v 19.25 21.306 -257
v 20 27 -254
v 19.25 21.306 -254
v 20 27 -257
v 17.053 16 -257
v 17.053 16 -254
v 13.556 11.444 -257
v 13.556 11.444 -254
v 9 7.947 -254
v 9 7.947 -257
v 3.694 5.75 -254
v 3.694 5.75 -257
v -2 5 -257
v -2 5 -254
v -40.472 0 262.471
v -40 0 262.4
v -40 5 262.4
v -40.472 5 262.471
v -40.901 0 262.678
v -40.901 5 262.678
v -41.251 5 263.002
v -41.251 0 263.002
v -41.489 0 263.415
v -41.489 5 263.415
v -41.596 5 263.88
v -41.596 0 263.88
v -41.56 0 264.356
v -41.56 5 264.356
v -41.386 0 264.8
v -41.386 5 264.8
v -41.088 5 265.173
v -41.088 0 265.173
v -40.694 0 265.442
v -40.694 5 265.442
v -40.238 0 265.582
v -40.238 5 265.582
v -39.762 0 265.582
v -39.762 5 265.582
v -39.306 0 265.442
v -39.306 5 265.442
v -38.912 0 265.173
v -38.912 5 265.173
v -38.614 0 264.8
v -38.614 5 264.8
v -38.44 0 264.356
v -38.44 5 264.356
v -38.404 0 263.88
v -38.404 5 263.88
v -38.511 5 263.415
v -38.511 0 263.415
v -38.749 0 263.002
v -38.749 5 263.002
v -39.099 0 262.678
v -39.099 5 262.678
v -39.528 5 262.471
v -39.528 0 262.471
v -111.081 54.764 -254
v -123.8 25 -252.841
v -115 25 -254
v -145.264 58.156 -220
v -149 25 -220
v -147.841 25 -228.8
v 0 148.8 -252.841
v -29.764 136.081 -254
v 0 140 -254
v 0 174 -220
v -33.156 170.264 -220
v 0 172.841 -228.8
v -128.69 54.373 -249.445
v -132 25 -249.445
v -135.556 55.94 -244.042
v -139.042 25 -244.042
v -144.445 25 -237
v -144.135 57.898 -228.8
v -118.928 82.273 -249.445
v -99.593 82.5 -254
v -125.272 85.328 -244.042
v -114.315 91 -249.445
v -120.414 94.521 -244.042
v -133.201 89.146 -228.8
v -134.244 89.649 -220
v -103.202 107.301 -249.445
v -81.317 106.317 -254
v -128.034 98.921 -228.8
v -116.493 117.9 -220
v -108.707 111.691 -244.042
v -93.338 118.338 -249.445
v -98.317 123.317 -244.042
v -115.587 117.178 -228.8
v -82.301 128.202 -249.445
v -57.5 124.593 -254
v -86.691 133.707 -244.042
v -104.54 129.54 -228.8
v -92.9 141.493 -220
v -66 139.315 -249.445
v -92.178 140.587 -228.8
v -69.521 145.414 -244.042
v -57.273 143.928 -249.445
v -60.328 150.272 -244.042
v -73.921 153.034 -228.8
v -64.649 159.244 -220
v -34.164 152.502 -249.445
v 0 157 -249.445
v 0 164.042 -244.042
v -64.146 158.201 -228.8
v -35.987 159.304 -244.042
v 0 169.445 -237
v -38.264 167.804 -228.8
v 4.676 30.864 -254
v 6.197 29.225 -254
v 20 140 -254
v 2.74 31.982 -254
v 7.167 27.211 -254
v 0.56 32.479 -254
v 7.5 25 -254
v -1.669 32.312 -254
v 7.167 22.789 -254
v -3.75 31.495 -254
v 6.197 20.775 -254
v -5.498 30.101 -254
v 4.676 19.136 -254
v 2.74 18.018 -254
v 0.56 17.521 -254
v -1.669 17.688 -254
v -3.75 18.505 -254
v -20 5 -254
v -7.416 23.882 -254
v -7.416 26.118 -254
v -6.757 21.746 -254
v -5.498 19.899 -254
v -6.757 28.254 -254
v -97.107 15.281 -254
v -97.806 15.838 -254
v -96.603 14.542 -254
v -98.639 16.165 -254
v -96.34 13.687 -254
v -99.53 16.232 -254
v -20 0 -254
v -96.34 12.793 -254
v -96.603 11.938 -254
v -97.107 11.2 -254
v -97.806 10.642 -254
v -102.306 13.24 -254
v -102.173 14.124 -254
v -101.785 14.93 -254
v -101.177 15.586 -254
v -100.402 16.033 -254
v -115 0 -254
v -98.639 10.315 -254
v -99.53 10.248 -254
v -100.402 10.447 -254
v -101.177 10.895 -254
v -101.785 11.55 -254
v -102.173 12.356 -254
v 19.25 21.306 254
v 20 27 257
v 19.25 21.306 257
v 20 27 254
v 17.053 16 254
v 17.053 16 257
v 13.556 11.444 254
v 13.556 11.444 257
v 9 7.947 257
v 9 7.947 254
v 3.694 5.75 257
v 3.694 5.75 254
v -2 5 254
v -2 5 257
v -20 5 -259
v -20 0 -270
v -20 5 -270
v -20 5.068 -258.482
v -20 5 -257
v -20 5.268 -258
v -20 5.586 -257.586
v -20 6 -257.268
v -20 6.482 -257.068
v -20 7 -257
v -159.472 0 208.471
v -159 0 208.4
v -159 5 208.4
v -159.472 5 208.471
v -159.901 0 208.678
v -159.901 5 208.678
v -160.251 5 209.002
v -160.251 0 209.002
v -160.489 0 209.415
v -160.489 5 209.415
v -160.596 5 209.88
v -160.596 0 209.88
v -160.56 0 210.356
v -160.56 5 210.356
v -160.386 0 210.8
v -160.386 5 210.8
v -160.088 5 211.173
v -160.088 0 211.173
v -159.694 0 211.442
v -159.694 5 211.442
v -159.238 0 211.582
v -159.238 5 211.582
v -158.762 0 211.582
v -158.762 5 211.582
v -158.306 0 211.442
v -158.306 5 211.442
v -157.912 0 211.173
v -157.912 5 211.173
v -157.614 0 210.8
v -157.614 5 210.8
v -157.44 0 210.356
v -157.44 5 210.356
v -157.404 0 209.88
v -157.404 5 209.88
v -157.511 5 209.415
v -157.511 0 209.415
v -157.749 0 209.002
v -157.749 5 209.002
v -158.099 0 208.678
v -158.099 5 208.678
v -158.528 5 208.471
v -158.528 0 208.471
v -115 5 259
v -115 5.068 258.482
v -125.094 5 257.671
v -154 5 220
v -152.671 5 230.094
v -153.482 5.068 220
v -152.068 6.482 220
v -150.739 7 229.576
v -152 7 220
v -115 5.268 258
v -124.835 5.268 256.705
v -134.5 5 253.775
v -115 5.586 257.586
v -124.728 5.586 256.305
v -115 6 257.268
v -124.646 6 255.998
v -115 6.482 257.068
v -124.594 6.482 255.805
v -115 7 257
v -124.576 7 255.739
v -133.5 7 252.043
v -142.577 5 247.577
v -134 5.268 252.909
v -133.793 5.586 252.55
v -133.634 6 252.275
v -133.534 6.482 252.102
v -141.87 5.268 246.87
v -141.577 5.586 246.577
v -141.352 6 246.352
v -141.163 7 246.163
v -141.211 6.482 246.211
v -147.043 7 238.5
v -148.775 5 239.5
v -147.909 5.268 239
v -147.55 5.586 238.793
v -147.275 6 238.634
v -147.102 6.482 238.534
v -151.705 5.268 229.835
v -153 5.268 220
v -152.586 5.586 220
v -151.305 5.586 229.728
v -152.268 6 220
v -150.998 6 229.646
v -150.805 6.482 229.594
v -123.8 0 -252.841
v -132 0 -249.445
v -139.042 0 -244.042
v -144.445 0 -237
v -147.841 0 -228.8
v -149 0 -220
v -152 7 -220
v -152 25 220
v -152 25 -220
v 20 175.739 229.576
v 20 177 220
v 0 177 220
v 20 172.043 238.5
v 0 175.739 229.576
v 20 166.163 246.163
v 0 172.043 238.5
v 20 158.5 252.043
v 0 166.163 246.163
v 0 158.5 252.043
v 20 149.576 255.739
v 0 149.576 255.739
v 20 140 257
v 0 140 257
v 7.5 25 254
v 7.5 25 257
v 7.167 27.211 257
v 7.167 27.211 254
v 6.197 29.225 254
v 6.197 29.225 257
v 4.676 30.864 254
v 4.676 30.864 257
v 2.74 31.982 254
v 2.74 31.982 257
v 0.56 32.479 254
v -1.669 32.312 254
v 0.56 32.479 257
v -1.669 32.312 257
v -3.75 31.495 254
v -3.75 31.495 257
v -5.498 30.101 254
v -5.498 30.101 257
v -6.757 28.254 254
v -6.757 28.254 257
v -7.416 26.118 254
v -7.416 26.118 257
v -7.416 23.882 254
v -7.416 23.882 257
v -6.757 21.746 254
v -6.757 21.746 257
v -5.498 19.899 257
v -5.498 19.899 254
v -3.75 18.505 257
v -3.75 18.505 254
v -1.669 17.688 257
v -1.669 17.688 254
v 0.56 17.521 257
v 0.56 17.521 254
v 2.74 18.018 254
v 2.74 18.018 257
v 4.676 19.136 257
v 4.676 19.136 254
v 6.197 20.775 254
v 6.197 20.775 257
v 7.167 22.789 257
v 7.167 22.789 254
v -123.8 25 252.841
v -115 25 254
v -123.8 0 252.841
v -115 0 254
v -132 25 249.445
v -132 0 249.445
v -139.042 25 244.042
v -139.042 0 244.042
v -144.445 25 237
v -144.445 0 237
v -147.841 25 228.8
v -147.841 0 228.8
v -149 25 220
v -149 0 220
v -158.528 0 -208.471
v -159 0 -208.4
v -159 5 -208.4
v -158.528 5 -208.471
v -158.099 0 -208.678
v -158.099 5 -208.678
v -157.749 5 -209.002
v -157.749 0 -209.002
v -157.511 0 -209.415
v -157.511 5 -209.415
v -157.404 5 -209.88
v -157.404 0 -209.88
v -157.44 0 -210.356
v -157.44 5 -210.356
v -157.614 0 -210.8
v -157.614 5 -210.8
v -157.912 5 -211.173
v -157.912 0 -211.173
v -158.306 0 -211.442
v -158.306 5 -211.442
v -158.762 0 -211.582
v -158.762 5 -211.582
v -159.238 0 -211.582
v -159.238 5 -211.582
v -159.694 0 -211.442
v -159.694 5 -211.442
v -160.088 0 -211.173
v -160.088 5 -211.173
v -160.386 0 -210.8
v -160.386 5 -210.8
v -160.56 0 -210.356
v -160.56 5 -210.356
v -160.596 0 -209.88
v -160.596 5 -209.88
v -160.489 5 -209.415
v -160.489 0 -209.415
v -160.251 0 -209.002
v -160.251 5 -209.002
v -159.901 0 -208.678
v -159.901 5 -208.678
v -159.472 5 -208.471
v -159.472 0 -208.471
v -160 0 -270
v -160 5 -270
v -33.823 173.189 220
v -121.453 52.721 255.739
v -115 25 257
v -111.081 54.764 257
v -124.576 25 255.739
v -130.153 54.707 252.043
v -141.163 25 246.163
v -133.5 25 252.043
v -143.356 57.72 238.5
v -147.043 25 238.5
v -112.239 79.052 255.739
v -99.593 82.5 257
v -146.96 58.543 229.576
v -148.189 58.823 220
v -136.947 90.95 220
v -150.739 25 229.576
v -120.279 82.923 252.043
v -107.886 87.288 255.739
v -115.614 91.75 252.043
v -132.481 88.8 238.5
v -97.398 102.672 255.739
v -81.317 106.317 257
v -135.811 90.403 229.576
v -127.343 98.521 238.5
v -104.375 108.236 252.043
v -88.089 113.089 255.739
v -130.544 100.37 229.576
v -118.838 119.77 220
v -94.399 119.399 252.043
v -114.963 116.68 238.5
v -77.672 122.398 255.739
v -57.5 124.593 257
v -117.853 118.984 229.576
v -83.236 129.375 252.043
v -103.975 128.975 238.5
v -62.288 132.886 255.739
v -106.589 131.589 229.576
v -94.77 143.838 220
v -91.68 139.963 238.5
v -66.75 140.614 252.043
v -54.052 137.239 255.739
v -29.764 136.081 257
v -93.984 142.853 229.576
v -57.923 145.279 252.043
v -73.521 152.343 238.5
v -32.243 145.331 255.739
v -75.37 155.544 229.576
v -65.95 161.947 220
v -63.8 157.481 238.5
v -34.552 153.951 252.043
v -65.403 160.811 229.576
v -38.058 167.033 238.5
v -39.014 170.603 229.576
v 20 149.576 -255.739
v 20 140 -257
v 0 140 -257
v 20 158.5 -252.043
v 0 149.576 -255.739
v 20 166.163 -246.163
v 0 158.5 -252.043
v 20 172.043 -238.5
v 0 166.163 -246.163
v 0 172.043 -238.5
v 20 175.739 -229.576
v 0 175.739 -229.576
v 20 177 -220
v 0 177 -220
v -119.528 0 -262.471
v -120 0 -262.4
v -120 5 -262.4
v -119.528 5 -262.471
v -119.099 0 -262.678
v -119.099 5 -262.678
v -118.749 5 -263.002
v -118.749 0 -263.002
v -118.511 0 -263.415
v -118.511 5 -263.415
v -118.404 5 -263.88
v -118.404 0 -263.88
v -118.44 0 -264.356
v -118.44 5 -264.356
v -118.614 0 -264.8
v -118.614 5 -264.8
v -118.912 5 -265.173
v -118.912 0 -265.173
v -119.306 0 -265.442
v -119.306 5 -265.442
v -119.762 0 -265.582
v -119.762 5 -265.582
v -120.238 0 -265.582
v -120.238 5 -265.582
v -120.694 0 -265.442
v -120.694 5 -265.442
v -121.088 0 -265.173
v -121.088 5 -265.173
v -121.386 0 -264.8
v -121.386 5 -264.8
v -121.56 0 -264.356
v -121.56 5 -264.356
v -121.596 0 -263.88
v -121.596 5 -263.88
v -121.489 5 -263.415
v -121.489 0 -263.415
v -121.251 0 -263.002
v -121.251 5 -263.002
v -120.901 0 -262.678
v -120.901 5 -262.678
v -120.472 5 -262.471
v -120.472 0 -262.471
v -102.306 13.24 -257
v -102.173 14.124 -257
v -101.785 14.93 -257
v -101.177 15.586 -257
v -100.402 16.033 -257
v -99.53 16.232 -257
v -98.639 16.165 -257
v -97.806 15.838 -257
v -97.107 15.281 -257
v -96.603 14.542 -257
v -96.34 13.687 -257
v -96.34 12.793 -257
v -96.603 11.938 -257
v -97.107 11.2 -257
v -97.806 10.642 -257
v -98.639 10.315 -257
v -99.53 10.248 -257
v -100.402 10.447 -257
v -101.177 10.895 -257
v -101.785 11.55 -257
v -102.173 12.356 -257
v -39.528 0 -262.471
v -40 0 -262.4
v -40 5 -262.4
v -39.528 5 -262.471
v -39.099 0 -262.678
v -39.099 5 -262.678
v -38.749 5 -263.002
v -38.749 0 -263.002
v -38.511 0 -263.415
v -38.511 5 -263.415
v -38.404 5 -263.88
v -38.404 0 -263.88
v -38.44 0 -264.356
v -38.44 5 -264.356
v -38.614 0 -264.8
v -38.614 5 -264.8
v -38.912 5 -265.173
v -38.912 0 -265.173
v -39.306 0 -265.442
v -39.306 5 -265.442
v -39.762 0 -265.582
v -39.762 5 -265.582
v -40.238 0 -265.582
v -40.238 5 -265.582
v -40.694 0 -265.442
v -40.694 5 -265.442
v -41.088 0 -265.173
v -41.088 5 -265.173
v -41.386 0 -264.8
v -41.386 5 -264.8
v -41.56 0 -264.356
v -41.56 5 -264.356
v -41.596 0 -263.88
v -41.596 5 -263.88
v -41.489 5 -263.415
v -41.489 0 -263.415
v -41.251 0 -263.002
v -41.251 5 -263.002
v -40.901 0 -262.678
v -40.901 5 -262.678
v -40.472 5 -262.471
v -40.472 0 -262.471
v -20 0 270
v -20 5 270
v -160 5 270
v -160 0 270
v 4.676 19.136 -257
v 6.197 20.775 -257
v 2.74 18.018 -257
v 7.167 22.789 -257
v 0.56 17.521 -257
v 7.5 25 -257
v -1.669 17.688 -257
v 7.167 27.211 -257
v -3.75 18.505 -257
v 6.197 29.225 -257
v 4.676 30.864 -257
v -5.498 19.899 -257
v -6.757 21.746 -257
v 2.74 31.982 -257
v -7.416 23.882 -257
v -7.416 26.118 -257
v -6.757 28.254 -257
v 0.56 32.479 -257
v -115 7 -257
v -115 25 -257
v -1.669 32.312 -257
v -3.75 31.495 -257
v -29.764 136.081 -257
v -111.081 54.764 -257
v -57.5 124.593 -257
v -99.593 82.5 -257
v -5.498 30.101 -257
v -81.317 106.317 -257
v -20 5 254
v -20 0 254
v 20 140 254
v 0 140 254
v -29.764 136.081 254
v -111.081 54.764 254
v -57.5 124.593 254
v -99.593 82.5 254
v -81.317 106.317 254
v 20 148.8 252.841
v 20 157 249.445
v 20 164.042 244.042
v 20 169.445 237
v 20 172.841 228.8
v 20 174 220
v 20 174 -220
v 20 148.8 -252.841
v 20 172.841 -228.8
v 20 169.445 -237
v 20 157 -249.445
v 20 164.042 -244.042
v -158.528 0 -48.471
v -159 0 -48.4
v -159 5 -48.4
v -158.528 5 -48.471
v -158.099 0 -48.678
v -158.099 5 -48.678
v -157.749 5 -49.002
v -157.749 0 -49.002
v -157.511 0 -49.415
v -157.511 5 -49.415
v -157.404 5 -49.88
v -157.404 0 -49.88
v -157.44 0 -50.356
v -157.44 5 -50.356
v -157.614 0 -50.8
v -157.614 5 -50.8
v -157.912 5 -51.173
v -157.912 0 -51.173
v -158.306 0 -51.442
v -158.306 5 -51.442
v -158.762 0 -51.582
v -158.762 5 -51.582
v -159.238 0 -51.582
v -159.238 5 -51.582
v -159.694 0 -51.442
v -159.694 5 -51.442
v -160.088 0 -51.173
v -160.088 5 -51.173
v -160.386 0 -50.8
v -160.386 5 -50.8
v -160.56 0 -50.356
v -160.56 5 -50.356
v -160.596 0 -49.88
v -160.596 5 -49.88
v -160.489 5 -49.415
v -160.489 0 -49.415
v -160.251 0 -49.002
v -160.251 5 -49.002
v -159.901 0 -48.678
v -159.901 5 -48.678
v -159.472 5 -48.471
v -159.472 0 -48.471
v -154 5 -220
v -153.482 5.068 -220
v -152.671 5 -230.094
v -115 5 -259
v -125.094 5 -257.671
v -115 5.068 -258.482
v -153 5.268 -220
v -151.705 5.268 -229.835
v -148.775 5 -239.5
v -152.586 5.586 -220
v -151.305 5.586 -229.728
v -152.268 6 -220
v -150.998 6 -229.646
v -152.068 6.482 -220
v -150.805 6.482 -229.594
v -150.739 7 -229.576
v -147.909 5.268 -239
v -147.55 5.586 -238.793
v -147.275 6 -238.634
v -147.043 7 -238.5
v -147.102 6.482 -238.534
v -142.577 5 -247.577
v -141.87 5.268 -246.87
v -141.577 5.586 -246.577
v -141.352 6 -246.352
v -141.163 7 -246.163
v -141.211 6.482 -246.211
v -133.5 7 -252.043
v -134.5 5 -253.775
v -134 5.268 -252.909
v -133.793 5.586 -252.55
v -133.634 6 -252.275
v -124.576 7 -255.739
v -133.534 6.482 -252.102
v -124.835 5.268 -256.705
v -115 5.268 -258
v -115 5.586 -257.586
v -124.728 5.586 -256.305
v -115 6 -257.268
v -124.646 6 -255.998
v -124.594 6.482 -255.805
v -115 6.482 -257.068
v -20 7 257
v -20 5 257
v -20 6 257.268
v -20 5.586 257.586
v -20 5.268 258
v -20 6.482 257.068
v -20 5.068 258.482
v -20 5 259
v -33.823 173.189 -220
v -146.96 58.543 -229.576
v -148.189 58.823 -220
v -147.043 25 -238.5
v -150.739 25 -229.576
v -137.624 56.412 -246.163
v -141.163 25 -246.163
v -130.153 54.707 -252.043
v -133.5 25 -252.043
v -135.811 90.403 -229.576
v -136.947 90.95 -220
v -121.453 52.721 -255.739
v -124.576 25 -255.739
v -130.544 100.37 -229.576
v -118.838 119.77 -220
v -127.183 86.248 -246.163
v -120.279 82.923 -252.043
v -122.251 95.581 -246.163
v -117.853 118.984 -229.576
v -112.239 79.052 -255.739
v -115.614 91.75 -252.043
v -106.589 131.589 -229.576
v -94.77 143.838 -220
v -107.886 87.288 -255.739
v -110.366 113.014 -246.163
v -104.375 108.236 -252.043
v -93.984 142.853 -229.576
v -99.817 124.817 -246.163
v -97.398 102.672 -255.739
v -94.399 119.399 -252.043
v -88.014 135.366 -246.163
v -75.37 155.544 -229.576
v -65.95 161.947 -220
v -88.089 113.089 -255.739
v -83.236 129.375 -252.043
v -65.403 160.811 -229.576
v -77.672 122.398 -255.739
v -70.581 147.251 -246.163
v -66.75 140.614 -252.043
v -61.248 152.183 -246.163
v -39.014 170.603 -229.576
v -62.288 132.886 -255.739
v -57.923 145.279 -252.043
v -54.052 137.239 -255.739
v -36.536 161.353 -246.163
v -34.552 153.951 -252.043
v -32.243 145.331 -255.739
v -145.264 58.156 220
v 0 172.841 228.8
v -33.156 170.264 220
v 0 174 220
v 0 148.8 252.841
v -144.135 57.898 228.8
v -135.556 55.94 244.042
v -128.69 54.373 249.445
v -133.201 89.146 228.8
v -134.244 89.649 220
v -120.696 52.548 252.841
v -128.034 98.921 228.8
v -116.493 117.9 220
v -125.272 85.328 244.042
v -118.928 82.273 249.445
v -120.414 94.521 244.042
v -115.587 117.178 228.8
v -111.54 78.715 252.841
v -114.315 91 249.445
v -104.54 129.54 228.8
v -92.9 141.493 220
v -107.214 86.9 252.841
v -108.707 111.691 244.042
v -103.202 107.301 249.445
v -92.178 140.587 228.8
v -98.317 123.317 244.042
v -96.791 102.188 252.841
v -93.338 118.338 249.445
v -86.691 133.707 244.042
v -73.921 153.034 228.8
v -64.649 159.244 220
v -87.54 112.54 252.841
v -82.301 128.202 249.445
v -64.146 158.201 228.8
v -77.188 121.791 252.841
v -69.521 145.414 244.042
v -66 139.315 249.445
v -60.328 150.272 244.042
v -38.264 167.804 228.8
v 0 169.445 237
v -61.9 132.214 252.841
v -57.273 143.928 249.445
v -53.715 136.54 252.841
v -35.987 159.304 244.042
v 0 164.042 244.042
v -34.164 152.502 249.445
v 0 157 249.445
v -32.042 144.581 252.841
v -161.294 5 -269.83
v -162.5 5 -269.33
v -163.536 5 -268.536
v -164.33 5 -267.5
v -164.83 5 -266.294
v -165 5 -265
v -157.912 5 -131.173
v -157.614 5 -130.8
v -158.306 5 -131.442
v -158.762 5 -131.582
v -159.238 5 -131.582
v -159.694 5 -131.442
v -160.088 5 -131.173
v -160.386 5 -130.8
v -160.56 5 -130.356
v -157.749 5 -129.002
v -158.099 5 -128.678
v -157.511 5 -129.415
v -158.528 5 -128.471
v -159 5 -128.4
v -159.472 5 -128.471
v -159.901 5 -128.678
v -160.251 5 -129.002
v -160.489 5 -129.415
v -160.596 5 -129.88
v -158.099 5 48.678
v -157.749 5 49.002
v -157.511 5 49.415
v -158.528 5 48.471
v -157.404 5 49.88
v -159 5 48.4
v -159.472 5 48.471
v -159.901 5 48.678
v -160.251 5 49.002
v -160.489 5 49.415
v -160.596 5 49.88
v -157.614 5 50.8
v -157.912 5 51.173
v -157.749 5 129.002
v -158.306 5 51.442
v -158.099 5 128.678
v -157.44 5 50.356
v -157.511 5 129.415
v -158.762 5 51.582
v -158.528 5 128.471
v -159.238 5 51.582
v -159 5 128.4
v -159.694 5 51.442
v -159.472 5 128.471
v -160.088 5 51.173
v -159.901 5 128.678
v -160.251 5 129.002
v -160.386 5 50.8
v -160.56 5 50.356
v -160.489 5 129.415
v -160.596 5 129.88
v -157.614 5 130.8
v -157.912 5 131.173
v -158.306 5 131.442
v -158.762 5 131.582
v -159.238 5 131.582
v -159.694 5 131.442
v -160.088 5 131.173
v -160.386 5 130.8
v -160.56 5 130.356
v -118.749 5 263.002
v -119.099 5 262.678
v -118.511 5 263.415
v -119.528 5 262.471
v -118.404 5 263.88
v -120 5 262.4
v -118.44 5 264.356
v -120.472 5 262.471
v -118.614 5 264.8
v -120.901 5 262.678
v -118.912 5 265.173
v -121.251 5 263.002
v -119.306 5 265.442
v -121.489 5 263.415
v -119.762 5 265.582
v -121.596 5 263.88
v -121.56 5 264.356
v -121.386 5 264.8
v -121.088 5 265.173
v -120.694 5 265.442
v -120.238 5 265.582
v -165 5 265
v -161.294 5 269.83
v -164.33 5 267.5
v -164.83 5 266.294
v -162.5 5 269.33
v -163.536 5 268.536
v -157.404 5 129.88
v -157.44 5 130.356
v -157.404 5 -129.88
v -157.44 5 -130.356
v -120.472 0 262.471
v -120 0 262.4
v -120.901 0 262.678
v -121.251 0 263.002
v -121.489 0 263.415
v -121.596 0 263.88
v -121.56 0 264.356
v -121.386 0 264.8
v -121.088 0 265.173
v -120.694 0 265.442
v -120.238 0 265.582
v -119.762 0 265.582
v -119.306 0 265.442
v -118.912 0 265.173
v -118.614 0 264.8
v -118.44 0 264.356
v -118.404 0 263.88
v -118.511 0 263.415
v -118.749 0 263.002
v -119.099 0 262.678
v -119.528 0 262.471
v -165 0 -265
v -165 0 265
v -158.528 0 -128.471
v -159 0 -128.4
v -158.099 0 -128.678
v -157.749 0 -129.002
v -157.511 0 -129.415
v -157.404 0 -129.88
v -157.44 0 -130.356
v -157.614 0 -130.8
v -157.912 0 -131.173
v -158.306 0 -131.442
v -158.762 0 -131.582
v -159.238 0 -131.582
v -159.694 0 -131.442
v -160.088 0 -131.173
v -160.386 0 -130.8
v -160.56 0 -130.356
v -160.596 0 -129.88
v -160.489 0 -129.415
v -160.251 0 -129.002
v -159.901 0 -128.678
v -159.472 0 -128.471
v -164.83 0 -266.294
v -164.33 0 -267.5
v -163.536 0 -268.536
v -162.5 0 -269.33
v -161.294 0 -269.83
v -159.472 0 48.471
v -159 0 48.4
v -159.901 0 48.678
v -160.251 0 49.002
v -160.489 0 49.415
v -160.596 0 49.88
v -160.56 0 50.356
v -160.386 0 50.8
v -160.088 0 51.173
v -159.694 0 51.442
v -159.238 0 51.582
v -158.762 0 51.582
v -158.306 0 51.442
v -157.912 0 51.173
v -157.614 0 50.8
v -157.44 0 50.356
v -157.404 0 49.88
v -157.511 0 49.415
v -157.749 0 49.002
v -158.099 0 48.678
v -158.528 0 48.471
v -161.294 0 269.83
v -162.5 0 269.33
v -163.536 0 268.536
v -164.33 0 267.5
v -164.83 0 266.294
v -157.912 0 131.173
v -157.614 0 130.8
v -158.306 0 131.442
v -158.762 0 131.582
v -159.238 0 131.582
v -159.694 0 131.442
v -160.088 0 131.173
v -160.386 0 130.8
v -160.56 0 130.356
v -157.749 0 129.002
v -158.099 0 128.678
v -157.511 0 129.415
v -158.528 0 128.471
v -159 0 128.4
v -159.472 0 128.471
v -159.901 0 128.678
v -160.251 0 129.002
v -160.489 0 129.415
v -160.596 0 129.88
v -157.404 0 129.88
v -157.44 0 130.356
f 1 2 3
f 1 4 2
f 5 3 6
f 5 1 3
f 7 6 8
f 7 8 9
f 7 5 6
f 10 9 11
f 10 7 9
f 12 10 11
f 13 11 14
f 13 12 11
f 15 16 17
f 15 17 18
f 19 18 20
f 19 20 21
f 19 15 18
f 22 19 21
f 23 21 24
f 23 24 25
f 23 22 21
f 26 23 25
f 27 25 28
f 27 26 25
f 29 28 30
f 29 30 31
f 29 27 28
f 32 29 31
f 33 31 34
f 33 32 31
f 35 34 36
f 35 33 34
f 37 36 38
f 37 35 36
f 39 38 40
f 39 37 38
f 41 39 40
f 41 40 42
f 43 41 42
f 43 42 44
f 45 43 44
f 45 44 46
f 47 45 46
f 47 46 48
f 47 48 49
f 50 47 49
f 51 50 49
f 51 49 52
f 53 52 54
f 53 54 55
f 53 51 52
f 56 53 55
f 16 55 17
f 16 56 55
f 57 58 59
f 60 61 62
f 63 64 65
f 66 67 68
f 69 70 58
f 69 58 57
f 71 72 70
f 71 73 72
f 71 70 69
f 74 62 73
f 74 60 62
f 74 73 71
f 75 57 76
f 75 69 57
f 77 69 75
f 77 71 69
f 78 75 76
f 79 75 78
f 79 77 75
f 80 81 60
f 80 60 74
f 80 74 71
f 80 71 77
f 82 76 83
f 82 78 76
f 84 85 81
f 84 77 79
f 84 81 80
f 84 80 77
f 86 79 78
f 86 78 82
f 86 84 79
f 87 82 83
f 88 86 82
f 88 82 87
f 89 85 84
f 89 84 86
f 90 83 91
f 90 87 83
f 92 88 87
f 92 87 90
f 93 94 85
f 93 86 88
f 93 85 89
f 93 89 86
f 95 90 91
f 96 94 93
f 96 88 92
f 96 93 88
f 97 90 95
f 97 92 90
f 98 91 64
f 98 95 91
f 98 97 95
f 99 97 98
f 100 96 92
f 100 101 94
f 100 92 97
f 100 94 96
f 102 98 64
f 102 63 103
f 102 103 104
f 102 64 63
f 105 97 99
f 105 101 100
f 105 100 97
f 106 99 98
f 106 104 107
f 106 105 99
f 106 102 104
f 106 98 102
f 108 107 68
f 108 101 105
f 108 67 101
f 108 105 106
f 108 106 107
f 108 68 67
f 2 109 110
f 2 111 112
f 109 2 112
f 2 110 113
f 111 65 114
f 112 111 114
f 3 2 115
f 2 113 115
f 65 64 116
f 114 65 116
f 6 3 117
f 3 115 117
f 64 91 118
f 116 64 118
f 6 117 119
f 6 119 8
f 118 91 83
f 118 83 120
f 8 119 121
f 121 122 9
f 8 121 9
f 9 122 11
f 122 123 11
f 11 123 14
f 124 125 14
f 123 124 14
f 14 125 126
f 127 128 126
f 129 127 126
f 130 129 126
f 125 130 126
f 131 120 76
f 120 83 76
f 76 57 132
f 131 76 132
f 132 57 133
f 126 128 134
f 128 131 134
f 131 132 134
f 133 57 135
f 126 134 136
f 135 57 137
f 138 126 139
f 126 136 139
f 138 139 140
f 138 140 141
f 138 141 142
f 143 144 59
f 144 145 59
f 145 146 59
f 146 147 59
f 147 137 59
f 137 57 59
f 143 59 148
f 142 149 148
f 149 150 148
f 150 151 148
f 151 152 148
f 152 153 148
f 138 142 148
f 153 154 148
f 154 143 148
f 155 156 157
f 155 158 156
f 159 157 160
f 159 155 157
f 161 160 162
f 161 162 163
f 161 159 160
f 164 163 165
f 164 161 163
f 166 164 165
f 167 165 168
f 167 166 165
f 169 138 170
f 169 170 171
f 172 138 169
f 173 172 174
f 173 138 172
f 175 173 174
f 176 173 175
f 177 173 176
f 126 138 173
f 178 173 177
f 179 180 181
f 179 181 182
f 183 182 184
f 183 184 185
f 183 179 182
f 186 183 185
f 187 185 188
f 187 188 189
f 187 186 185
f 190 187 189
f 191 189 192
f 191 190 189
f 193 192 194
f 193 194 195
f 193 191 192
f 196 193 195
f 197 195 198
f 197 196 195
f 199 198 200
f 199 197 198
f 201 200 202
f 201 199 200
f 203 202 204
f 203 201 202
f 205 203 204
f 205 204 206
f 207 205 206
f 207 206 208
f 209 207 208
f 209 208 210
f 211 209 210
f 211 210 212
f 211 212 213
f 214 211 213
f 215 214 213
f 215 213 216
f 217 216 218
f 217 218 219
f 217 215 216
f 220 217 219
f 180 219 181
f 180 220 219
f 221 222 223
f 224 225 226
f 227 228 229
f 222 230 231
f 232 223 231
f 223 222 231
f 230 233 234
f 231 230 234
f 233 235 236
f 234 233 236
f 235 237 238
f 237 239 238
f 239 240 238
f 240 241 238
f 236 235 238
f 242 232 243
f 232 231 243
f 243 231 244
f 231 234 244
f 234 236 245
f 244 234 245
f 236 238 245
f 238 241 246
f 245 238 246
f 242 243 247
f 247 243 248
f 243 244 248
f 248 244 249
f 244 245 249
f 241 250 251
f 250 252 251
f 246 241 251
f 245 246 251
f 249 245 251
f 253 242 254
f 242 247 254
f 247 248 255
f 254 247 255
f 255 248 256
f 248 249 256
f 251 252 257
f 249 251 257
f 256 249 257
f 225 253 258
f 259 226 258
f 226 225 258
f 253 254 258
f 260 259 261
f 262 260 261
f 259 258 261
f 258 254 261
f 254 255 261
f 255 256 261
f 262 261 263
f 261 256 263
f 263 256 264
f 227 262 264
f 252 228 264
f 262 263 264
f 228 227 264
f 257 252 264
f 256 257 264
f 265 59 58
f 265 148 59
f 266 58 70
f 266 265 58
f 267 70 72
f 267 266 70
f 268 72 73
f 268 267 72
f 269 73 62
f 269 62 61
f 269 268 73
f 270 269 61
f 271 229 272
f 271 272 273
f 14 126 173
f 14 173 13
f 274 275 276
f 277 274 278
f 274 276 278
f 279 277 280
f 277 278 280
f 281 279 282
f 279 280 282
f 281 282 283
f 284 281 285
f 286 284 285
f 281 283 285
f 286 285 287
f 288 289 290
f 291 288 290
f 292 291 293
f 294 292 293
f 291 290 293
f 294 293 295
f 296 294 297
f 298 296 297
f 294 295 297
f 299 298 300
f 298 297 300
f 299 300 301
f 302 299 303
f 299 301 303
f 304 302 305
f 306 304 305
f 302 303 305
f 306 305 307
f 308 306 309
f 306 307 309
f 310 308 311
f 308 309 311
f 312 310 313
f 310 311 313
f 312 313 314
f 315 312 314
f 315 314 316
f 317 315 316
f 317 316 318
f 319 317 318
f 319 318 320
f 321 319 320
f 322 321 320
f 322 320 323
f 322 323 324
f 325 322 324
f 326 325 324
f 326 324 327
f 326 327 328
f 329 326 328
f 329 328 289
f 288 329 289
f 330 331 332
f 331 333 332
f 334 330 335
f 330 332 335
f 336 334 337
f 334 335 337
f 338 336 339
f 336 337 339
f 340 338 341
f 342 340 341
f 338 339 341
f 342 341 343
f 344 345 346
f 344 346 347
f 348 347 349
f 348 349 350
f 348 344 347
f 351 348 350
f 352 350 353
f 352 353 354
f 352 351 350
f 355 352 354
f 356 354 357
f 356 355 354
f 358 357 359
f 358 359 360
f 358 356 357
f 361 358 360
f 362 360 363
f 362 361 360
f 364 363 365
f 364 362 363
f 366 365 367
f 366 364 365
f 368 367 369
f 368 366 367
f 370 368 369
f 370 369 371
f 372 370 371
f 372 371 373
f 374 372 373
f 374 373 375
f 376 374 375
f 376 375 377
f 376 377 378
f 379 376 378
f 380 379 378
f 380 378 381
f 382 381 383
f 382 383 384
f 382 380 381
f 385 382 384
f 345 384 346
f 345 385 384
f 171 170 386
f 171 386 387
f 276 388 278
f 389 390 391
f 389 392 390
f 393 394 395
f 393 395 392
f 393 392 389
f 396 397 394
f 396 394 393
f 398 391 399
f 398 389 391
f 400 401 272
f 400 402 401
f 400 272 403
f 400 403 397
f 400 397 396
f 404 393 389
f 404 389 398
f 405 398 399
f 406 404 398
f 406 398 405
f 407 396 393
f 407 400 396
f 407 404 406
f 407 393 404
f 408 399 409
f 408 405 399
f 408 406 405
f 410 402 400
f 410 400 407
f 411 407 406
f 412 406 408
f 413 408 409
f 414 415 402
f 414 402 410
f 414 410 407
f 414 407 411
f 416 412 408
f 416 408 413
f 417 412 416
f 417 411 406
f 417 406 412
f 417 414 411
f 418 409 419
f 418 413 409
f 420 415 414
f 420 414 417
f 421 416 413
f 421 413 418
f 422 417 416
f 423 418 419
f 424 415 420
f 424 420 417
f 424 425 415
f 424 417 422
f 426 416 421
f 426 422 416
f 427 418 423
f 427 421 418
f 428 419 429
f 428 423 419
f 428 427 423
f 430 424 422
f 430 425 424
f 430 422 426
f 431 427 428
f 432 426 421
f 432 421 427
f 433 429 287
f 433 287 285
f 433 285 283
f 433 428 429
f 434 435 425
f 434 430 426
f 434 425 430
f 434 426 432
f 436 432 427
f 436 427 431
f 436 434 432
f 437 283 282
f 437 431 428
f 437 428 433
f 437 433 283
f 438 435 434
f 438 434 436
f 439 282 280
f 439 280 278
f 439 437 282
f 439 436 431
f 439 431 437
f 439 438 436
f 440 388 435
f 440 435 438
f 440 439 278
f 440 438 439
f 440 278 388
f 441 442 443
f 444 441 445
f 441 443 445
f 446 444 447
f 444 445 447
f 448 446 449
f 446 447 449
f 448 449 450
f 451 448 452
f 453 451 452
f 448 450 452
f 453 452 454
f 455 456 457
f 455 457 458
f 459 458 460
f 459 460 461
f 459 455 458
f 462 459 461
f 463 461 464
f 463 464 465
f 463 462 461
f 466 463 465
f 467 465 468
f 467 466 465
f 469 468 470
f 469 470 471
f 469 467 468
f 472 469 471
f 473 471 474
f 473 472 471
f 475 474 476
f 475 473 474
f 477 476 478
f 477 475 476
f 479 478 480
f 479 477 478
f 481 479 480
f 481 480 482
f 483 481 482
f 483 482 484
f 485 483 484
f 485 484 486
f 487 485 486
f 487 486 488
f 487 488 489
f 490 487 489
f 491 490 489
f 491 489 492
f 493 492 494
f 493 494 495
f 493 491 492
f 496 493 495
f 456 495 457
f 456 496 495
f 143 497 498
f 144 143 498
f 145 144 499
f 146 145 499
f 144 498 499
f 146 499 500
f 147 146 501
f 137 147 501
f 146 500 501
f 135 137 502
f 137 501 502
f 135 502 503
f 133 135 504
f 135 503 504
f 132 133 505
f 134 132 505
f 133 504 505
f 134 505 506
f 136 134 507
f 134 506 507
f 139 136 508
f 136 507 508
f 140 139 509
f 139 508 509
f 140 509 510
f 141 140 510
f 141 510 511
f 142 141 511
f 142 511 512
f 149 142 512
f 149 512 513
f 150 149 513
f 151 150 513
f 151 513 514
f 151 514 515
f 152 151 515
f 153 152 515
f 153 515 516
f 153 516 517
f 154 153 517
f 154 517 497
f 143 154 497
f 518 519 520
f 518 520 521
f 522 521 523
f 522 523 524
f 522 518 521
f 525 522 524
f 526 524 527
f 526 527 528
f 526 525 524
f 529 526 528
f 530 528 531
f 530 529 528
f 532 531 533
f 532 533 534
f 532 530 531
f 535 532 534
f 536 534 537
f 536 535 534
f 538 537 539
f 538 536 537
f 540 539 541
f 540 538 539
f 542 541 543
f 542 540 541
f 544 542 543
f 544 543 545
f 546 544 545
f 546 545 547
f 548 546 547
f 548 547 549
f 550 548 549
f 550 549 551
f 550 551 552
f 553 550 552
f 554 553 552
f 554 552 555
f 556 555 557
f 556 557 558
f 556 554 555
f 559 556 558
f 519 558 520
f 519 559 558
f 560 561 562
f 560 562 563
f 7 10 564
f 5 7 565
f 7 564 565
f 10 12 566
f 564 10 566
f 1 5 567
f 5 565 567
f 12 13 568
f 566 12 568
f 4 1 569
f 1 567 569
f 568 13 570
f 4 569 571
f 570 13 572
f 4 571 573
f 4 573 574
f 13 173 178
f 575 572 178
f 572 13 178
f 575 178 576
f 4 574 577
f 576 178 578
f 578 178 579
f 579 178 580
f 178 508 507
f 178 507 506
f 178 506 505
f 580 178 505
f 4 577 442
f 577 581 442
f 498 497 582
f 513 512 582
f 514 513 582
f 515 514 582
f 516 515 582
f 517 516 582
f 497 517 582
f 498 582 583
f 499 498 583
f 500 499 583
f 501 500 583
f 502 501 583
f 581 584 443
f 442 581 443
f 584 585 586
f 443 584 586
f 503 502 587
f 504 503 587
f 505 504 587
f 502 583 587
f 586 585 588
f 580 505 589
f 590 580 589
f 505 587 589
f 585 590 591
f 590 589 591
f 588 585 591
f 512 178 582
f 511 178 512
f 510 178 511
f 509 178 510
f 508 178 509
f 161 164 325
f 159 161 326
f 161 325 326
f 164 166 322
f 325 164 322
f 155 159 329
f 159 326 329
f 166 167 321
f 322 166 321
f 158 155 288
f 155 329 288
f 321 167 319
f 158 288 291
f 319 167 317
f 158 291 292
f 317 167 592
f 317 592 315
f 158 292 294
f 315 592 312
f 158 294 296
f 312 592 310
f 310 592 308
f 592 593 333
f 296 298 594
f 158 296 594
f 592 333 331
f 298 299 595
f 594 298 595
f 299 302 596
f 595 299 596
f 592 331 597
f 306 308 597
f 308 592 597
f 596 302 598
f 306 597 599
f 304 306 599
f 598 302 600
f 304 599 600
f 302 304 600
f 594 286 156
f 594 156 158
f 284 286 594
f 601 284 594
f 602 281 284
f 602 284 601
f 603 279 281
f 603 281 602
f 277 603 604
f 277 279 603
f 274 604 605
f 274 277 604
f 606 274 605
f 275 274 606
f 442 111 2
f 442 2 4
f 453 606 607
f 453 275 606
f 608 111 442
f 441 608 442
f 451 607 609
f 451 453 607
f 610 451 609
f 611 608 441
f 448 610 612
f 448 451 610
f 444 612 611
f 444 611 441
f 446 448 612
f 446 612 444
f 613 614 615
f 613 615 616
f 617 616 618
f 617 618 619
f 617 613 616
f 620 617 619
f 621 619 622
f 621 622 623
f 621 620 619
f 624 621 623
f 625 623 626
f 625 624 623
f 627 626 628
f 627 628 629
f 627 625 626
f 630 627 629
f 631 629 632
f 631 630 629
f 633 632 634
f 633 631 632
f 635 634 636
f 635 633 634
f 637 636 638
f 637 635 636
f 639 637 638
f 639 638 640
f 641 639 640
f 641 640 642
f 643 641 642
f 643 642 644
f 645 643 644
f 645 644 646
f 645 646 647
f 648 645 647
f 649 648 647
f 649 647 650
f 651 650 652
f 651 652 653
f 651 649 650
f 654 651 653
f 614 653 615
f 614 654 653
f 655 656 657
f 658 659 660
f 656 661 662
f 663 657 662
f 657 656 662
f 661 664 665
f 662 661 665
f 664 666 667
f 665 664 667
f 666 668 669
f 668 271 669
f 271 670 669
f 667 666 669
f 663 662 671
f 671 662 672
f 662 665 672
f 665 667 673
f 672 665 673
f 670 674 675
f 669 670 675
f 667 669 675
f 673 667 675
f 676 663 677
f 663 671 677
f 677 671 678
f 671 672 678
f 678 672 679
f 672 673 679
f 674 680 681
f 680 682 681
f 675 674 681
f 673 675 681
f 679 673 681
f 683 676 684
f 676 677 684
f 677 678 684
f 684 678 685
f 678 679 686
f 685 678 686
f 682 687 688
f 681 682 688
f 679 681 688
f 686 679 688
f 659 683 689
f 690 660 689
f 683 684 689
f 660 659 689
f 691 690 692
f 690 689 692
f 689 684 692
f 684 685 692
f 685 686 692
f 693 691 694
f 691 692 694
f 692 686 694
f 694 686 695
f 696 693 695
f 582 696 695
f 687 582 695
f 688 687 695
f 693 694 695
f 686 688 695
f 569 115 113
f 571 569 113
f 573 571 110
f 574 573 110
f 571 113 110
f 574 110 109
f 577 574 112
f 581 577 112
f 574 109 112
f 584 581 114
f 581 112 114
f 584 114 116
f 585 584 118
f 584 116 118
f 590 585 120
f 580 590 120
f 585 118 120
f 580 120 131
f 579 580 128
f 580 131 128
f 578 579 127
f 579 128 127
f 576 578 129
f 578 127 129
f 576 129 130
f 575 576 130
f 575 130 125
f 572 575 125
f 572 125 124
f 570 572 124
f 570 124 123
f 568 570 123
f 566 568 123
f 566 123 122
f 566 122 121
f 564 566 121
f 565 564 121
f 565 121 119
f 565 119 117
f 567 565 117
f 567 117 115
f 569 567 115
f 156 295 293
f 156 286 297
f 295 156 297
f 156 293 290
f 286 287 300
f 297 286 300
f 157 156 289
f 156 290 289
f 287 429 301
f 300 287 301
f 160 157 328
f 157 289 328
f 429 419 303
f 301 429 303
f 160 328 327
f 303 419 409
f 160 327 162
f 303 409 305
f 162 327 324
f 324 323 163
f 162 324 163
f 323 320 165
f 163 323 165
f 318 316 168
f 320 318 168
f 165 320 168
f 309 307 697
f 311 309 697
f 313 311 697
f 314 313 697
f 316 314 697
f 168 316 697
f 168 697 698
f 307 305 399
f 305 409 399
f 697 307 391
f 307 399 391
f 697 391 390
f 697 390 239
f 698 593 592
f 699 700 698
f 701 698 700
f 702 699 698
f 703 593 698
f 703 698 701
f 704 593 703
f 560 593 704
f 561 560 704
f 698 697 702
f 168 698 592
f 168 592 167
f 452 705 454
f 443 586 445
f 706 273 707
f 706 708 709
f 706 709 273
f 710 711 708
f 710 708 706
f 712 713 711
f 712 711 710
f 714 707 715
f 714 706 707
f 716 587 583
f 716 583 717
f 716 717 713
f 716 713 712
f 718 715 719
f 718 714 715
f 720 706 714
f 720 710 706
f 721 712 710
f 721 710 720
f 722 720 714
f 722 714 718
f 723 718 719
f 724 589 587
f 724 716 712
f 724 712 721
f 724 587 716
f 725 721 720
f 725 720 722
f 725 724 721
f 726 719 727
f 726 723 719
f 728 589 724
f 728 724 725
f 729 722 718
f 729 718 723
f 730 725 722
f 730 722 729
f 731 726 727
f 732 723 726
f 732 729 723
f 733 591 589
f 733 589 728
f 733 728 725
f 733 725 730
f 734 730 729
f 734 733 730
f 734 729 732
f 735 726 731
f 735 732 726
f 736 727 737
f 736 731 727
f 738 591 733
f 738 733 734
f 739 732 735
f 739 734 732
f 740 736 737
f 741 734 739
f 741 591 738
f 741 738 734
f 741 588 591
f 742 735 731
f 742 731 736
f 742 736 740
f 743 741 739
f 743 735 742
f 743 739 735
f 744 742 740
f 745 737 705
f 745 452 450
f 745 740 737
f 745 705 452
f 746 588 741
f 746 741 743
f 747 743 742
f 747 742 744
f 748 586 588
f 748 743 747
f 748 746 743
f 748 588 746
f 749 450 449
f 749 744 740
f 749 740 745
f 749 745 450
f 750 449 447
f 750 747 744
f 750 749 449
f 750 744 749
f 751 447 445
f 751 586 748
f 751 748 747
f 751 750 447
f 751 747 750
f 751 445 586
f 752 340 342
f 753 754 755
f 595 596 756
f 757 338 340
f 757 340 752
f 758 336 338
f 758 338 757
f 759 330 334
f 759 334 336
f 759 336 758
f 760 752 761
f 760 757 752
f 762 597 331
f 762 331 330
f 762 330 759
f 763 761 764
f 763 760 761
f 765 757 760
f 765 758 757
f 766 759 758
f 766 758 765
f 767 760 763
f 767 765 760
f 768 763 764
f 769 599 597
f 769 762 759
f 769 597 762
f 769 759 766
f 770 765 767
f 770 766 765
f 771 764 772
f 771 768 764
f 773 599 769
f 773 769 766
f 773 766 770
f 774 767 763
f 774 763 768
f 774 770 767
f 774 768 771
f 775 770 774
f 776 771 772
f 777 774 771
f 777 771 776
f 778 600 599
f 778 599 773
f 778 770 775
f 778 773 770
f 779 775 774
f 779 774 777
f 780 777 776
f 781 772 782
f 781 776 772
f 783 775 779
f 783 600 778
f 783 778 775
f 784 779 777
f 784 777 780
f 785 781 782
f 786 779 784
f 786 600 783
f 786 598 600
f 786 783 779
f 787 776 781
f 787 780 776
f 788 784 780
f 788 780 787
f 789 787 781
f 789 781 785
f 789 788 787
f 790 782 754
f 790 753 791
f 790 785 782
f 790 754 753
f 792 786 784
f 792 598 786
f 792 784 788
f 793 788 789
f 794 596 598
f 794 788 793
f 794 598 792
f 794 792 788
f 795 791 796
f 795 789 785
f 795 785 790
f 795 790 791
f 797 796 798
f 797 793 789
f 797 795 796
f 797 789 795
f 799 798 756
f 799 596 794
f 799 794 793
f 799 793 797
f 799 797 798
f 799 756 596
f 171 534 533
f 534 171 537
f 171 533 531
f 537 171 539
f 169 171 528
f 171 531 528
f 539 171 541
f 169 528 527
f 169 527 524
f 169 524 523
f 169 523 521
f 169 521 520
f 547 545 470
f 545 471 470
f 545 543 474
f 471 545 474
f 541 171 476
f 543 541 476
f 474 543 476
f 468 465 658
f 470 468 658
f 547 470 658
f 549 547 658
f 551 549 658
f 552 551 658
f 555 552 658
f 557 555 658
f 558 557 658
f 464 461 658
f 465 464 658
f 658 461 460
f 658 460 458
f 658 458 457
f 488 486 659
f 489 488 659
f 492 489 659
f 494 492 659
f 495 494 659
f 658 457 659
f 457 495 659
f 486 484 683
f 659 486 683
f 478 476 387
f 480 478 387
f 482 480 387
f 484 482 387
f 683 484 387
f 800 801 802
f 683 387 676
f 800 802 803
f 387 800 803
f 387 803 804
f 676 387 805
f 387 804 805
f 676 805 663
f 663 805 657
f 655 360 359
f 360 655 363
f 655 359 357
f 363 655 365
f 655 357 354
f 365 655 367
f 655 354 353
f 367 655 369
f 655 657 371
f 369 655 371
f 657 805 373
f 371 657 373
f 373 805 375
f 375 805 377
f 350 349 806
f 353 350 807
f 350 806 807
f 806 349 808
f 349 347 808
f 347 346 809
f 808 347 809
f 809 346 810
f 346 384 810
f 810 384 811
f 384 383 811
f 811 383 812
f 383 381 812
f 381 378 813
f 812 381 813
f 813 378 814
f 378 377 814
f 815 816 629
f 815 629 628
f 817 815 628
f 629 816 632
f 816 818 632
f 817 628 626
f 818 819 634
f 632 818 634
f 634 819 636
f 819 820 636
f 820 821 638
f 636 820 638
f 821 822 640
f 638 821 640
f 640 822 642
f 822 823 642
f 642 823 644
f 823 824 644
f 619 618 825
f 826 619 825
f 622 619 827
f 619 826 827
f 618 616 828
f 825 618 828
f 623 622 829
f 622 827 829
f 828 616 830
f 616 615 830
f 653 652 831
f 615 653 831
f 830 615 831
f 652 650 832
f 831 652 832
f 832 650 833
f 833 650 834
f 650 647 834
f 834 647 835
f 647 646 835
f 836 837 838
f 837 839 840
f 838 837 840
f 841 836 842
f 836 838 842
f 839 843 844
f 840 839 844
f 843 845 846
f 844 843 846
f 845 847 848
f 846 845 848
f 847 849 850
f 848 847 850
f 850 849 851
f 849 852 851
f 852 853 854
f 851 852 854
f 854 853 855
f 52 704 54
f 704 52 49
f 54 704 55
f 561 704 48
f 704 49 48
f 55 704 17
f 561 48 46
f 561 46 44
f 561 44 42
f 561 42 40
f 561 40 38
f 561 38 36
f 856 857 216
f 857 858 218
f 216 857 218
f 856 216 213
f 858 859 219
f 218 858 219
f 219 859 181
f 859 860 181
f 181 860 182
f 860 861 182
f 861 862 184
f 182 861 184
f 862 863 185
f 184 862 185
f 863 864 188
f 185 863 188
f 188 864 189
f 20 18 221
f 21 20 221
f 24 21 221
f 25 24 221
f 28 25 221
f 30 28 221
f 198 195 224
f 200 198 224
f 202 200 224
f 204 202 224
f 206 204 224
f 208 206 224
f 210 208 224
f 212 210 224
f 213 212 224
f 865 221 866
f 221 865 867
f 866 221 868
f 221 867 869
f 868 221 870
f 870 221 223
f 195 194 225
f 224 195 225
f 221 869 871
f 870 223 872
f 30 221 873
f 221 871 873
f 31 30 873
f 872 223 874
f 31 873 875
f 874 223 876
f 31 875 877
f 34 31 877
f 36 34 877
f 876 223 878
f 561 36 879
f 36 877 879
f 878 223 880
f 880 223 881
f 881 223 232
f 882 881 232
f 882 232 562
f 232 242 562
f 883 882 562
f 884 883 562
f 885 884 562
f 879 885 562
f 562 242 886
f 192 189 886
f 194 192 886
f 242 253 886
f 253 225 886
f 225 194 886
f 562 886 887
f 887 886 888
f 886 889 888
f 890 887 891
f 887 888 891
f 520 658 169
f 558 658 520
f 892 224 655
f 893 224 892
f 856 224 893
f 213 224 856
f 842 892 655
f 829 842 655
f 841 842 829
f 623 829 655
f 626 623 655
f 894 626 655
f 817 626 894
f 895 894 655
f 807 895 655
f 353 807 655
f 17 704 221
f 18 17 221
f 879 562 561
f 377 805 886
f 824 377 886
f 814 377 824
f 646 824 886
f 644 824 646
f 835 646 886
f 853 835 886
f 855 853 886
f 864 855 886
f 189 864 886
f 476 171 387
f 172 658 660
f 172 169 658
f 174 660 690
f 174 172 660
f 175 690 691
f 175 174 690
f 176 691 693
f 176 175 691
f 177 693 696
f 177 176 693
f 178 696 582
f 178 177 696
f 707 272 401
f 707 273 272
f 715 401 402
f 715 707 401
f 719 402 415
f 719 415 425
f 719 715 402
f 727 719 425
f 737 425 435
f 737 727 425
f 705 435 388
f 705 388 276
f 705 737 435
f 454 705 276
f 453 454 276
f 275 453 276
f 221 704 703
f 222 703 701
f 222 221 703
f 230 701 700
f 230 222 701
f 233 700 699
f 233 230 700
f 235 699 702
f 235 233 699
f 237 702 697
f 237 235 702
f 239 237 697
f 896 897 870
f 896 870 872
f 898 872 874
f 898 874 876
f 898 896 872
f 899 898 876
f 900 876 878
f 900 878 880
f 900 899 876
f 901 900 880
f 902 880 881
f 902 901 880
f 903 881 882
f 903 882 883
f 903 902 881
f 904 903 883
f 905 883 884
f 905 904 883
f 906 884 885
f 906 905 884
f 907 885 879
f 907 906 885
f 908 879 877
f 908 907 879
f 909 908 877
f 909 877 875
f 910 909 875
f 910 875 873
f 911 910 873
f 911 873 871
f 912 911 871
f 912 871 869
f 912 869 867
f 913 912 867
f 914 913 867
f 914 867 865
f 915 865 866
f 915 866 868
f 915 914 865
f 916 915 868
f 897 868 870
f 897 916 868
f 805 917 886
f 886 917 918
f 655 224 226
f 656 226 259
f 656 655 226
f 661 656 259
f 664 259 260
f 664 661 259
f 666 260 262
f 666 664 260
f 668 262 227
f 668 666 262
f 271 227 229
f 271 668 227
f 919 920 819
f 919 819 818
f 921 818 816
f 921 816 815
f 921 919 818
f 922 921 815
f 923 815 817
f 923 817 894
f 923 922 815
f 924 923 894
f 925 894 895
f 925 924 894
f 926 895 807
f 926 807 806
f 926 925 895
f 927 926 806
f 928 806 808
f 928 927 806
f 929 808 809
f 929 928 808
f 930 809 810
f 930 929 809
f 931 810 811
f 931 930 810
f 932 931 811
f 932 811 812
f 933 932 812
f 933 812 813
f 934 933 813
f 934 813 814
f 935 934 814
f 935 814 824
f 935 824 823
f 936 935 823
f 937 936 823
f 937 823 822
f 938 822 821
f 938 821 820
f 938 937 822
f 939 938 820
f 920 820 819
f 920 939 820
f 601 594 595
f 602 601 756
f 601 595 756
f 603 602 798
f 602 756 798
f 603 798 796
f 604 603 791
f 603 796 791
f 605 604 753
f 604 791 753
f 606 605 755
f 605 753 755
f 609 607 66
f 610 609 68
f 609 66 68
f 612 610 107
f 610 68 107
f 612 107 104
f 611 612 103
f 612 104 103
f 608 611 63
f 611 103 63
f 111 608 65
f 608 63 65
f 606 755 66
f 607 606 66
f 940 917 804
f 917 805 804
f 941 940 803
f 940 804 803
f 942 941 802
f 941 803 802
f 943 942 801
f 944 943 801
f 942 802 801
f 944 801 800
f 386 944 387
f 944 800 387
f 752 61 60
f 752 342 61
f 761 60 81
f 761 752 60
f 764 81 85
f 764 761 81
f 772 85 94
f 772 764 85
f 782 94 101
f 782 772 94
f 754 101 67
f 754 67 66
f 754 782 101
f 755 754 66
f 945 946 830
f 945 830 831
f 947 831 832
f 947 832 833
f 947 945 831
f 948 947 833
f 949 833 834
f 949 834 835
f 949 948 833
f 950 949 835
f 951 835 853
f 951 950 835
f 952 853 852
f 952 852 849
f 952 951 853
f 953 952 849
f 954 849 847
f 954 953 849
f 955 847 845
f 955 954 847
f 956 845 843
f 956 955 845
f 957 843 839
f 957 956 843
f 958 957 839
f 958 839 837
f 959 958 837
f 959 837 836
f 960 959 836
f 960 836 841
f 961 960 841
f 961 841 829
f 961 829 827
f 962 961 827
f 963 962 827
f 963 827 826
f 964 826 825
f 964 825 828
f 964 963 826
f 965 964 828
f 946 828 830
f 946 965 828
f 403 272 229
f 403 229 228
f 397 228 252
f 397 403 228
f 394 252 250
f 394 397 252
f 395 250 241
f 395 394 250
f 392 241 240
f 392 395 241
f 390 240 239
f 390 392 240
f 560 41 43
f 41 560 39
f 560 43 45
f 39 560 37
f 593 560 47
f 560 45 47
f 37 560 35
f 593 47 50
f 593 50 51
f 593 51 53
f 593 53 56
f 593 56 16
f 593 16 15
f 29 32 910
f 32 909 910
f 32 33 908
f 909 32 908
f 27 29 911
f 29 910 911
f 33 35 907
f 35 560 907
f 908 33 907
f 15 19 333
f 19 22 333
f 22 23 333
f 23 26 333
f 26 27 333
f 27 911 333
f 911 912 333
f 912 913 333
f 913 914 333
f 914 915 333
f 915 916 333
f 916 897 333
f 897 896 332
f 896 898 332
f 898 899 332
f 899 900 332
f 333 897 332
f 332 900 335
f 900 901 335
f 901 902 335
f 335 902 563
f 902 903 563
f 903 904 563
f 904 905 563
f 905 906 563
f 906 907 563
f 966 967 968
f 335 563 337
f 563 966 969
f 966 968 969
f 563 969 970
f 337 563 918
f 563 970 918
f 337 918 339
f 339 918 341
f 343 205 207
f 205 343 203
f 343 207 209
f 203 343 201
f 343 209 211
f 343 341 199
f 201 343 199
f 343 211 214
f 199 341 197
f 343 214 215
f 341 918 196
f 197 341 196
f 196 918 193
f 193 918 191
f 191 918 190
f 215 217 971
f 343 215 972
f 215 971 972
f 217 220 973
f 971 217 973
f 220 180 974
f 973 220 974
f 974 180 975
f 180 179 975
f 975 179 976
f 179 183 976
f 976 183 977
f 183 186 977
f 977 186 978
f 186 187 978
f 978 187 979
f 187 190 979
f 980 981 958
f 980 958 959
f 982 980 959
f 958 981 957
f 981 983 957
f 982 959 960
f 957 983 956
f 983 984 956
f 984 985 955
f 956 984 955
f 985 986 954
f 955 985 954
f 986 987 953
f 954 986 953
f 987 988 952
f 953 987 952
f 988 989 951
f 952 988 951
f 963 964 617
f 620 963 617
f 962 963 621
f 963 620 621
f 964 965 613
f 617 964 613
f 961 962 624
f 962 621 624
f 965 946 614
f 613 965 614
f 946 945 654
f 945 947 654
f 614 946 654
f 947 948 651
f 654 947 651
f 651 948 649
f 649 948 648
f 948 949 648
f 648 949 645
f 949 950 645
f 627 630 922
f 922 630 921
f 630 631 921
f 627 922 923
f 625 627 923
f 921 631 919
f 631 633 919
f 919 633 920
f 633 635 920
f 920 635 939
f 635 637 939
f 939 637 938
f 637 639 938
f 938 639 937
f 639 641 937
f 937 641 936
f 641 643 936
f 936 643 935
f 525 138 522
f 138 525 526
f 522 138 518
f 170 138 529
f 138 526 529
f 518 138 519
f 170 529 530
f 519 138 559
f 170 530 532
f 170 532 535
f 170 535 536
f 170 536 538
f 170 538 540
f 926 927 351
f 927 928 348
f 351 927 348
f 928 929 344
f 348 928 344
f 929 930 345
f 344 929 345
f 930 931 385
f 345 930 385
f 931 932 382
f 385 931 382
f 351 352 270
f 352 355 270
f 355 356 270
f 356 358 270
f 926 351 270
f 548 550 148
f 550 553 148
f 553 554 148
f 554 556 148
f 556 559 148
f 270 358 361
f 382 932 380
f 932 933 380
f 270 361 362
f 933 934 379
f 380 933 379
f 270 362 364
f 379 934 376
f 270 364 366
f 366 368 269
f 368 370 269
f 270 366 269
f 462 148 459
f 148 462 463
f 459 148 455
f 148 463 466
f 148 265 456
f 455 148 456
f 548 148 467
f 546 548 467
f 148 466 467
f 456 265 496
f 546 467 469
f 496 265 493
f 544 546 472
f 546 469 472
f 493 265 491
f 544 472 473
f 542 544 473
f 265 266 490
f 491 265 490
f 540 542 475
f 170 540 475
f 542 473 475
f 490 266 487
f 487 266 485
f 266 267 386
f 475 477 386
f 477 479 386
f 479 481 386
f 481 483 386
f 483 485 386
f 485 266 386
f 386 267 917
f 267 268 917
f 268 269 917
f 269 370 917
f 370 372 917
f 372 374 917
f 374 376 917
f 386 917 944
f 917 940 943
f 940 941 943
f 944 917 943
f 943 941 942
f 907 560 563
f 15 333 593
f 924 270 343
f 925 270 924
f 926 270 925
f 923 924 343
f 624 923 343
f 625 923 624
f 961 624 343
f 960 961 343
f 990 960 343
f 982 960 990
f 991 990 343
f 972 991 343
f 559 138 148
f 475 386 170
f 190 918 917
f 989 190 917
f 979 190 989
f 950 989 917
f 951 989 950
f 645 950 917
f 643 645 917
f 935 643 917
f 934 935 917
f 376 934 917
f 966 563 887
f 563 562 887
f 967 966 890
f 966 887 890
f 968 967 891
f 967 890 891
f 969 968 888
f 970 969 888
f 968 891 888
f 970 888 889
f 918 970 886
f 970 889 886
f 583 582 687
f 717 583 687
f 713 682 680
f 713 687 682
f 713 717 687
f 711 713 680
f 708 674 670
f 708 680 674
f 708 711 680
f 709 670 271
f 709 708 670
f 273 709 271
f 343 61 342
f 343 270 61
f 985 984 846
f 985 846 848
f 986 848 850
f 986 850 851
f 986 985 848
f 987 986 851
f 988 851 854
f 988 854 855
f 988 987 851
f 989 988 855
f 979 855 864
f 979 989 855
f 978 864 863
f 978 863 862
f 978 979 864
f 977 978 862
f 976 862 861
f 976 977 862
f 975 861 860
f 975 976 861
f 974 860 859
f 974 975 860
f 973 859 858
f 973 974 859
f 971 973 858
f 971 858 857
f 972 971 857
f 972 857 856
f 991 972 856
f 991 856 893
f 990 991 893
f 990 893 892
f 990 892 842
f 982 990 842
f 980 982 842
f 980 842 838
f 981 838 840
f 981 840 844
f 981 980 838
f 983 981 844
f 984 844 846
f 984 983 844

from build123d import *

# Parameters (mm, degrees)
SKETCH1_R           = 1.6
BOSS_EXTRUDE1_DEPTH = 5
BOSS_EXTRUDE5_DEPTH = 20
FILLET8_R           = 34
FILLET9_R           = 37
REVOLVE4_ANGLE      = 90
BOSS_EXTRUDE6_DEPTH = 20
CUT_EXTRUDE3_REACH  = 593.738
SKETCH16_W          = 40
SKETCH16_H          = 5
FILLET10_R          = 22
CUT_EXTRUDE4_REACH  = 581.899
SKETCH17_R          = 7.5
FILLET11_R          = 5
FILLET12_R          = 2
SKETCH18_R          = 3
CUT_EXTRUDE5_DEPTH  = 7


with BuildPart() as part:
    # Sketch1 → Boss-Extrude1 (new body)
    with BuildSketch(Plane(origin=(0, 0, 0), x_dir=(1, 0, 0), z_dir=(0, 1, 0))):
        Polygon((-165, 270), (-165, -270), (0, -270), (0, -254), (-149, -254), (-149, 254), (0, 254), (0, 270), align=None)
        with Locations(Location((-159, 130, 0), (0, 0, 270))):
            Circle(SKETCH1_R, mode=Mode.SUBTRACT)
        with Locations(Location((-159, 50, 0), (0, 0, 270))):
            Circle(SKETCH1_R, mode=Mode.SUBTRACT)
        with Locations(Location((-120, 264, 0), (0, 0, 270))):
            Circle(SKETCH1_R, mode=Mode.SUBTRACT)
        with Locations(Location((-40, 264, 0), (0, 0, 270))):
            Circle(SKETCH1_R, mode=Mode.SUBTRACT)
        with Locations(Location((-159, 210, 0), (0, 0, 270))):
            Circle(SKETCH1_R, mode=Mode.SUBTRACT)
        with Locations(Location((-40, -264, 0), (0, 0, 90))):
            Circle(SKETCH1_R, mode=Mode.SUBTRACT)
        with Locations(Location((-120, -264, 0), (0, 0, 90))):
            Circle(SKETCH1_R, mode=Mode.SUBTRACT)
        with Locations(Location((-159, -210, 0), (0, 0, 90))):
            Circle(SKETCH1_R, mode=Mode.SUBTRACT)
        with Locations(Location((-159, -50, 0), (0, 0, 90))):
            Circle(SKETCH1_R, mode=Mode.SUBTRACT)
        with Locations(Location((-159, -130, 0), (0, 0, 90))):
            Circle(SKETCH1_R, mode=Mode.SUBTRACT)
    extrude(amount=BOSS_EXTRUDE1_DEPTH)

    # Sketch12 → Boss-Extrude5 (add)
    with BuildSketch(Plane(origin=(0, 5, 0), x_dir=(1, 0, 0), z_dir=(0, 1, 0))):
        Polygon((0, 254), (-149, 254), (-149, -254), (0, -254), (0, -257), (-152, -257), (-152, 257), (0, 257), align=None)
    extrude(amount=BOSS_EXTRUDE5_DEPTH)

    # Fillet8
    fillet8_edges = [part.edges().sort_by_distance(p)[0] for p in [
        (-149, 12.5, -254),
        (-149, 12.5, 254),
    ]]
    fillet(fillet8_edges, radius=FILLET8_R)

    # Fillet9
    fillet9_edges = [part.edges().sort_by_distance(p)[0] for p in [
        (-152, 15, -257),
        (-152, 15, 257),
    ]]
    fillet(fillet9_edges, radius=FILLET9_R)

    # Sketch13 → Revolve4 (revolve)
    with BuildSketch(Plane(origin=(0, 25, 0), x_dir=(1, 0, 0), z_dir=(0, 1, 0))):
        with BuildLine():
            Line((0, 254), (-115, 254))
            ThreePointArc((-115, 254), (-139.04163056, 244.04163056), (-149, 220))
            Line((-149, 220), (-149, -220))
            ThreePointArc((-149, -220), (-139.04163056, -244.04163056), (-115, -254))
            Line((-115, -254), (0, -254))
            Line((0, -254), (0, -257))
            Line((0, -257), (-115, -257))
            ThreePointArc((-115, -257), (-141.162950904, -246.162950904), (-152, -220))
            Line((-152, -220), (-152, 220))
            ThreePointArc((-152, 220), (-141.162950904, 246.162950904), (-115, 257))
            Line((-115, 257), (0, 257))
            Line((0, 257), (0, 254))
        make_face()
    revolve(axis=Axis((0, 25, -257), (0, 0, -1)), revolution_arc=REVOLVE4_ANGLE)

    # Sketch15 → Boss-Extrude6 (add)
    with BuildSketch(Plane(origin=(0, 0, 0), x_dir=(0, 0, -1), z_dir=(1, 0, 0))):
        with BuildLine():
            Line((-254, 5), (-254, 140))
            ThreePointArc((-254, 140), (-244.04163056, 164.04163056), (-220, 174))
            Line((-220, 174), (220, 174))
            ThreePointArc((220, 174), (244.04163056, 164.04163056), (254, 140))
            Line((254, 140), (254, 5))
            Line((254, 5), (254, 0))
            Line((254, 0), (270, 0))
            Line((270, 0), (270, 5))
            Line((270, 5), (257, 5))
            Line((257, 5), (257, 140))
            ThreePointArc((257, 140), (246.162950904, 166.162950904), (220, 177))
            Line((220, 177), (-220, 177))
            ThreePointArc((-220, 177), (-246.162950904, 166.162950904), (-257, 140))
            Line((-257, 140), (-257, 5))
            Line((-257, 5), (-270, 5))
            Line((-270, 5), (-270, 0))
            Line((-270, 0), (-254, 0))
            Line((-254, 0), (-254, 5))
        make_face()
    extrude(amount=BOSS_EXTRUDE6_DEPTH)

    # Cut-Extrude3: up to this face of the body (flat: up to its plane)
    cut_extrude3_end = Plane(part.part.faces().sort_by_distance((-72.5, 2.5, -270))[0])
    # Sketch16 → Cut-Extrude3 (cut, up to the picked face)
    with BuildSketch(Plane.XY.offset(270), mode=Mode.PRIVATE) as cut_extrude3_sk1:
        with Locations((0, 2.5)):
            Rectangle(SKETCH16_W, SKETCH16_H)
    cut_extrude3_tool1 = split(extrude(cut_extrude3_sk1.sketch, amount=-CUT_EXTRUDE3_REACH, mode=Mode.PRIVATE), bisect_by=cut_extrude3_end, keep=Keep.BOTH, mode=Mode.PRIVATE)
    add(cut_extrude3_tool1.solids().sort_by(Axis((0, 2.5, 270), (0, 0, -1)))[0], mode=Mode.SUBTRACT)

    # Fillet10
    fillet10_edges = [part.edges().sort_by_distance(p)[0] for p in [
        (20, 5, 255.5),
        (20, 5, -255.5),
    ]]
    fillet(fillet10_edges, radius=FILLET10_R)

    # Cut-Extrude4: up to this face of the body (flat: up to its plane)
    cut_extrude4_end = Plane(part.part.faces().sort_by_distance((-40.16059182, 65.16059182, -257))[0])
    # Sketch17 → Cut-Extrude4 (cut, up to the picked face)
    with BuildSketch(Plane.XY.offset(257), mode=Mode.PRIVATE) as cut_extrude4_sk1:
        with Locations((0, 25)):
            Circle(SKETCH17_R)
    cut_extrude4_tool1 = split(extrude(cut_extrude4_sk1.sketch, amount=-CUT_EXTRUDE4_REACH, mode=Mode.PRIVATE), bisect_by=cut_extrude4_end, keep=Keep.BOTH, mode=Mode.PRIVATE)
    add(cut_extrude4_tool1.solids().sort_by(Axis((0, 25, 257), (0, 0, -1)))[0], mode=Mode.SUBTRACT)

    # Fillet11
    fillet11_edges = [part.edges().sort_by_distance(p)[0] for p in [
        (-165, 2.5, 270),
        (-165, 2.5, -270),
    ]]
    fillet(fillet11_edges, radius=FILLET11_R)

    # Fillet12
    fillet12_edges = [part.edges().sort_by_distance(p)[0] for p in [
        (-152, 5, 0),
        (-67.5, 5, 257),
        (-141.162950904, 5, -246.162950904),
        (-141.162950904, 5, 246.162950904),
        (-67.5, 5, -257),
    ]]
    fillet(fillet12_edges, radius=FILLET12_R)

    # Sketch18 → Cut-Extrude5 (cut)
    with BuildSketch(Plane(origin=(0, 0, -257), x_dir=(-1, 0, 0), z_dir=(0, 0, -1))):
        with Locations((99.306112319, 13.240065646)):
            Circle(SKETCH18_R)
    extrude(amount=-CUT_EXTRUDE5_DEPTH, mode=Mode.SUBTRACT)


solid = part.part
